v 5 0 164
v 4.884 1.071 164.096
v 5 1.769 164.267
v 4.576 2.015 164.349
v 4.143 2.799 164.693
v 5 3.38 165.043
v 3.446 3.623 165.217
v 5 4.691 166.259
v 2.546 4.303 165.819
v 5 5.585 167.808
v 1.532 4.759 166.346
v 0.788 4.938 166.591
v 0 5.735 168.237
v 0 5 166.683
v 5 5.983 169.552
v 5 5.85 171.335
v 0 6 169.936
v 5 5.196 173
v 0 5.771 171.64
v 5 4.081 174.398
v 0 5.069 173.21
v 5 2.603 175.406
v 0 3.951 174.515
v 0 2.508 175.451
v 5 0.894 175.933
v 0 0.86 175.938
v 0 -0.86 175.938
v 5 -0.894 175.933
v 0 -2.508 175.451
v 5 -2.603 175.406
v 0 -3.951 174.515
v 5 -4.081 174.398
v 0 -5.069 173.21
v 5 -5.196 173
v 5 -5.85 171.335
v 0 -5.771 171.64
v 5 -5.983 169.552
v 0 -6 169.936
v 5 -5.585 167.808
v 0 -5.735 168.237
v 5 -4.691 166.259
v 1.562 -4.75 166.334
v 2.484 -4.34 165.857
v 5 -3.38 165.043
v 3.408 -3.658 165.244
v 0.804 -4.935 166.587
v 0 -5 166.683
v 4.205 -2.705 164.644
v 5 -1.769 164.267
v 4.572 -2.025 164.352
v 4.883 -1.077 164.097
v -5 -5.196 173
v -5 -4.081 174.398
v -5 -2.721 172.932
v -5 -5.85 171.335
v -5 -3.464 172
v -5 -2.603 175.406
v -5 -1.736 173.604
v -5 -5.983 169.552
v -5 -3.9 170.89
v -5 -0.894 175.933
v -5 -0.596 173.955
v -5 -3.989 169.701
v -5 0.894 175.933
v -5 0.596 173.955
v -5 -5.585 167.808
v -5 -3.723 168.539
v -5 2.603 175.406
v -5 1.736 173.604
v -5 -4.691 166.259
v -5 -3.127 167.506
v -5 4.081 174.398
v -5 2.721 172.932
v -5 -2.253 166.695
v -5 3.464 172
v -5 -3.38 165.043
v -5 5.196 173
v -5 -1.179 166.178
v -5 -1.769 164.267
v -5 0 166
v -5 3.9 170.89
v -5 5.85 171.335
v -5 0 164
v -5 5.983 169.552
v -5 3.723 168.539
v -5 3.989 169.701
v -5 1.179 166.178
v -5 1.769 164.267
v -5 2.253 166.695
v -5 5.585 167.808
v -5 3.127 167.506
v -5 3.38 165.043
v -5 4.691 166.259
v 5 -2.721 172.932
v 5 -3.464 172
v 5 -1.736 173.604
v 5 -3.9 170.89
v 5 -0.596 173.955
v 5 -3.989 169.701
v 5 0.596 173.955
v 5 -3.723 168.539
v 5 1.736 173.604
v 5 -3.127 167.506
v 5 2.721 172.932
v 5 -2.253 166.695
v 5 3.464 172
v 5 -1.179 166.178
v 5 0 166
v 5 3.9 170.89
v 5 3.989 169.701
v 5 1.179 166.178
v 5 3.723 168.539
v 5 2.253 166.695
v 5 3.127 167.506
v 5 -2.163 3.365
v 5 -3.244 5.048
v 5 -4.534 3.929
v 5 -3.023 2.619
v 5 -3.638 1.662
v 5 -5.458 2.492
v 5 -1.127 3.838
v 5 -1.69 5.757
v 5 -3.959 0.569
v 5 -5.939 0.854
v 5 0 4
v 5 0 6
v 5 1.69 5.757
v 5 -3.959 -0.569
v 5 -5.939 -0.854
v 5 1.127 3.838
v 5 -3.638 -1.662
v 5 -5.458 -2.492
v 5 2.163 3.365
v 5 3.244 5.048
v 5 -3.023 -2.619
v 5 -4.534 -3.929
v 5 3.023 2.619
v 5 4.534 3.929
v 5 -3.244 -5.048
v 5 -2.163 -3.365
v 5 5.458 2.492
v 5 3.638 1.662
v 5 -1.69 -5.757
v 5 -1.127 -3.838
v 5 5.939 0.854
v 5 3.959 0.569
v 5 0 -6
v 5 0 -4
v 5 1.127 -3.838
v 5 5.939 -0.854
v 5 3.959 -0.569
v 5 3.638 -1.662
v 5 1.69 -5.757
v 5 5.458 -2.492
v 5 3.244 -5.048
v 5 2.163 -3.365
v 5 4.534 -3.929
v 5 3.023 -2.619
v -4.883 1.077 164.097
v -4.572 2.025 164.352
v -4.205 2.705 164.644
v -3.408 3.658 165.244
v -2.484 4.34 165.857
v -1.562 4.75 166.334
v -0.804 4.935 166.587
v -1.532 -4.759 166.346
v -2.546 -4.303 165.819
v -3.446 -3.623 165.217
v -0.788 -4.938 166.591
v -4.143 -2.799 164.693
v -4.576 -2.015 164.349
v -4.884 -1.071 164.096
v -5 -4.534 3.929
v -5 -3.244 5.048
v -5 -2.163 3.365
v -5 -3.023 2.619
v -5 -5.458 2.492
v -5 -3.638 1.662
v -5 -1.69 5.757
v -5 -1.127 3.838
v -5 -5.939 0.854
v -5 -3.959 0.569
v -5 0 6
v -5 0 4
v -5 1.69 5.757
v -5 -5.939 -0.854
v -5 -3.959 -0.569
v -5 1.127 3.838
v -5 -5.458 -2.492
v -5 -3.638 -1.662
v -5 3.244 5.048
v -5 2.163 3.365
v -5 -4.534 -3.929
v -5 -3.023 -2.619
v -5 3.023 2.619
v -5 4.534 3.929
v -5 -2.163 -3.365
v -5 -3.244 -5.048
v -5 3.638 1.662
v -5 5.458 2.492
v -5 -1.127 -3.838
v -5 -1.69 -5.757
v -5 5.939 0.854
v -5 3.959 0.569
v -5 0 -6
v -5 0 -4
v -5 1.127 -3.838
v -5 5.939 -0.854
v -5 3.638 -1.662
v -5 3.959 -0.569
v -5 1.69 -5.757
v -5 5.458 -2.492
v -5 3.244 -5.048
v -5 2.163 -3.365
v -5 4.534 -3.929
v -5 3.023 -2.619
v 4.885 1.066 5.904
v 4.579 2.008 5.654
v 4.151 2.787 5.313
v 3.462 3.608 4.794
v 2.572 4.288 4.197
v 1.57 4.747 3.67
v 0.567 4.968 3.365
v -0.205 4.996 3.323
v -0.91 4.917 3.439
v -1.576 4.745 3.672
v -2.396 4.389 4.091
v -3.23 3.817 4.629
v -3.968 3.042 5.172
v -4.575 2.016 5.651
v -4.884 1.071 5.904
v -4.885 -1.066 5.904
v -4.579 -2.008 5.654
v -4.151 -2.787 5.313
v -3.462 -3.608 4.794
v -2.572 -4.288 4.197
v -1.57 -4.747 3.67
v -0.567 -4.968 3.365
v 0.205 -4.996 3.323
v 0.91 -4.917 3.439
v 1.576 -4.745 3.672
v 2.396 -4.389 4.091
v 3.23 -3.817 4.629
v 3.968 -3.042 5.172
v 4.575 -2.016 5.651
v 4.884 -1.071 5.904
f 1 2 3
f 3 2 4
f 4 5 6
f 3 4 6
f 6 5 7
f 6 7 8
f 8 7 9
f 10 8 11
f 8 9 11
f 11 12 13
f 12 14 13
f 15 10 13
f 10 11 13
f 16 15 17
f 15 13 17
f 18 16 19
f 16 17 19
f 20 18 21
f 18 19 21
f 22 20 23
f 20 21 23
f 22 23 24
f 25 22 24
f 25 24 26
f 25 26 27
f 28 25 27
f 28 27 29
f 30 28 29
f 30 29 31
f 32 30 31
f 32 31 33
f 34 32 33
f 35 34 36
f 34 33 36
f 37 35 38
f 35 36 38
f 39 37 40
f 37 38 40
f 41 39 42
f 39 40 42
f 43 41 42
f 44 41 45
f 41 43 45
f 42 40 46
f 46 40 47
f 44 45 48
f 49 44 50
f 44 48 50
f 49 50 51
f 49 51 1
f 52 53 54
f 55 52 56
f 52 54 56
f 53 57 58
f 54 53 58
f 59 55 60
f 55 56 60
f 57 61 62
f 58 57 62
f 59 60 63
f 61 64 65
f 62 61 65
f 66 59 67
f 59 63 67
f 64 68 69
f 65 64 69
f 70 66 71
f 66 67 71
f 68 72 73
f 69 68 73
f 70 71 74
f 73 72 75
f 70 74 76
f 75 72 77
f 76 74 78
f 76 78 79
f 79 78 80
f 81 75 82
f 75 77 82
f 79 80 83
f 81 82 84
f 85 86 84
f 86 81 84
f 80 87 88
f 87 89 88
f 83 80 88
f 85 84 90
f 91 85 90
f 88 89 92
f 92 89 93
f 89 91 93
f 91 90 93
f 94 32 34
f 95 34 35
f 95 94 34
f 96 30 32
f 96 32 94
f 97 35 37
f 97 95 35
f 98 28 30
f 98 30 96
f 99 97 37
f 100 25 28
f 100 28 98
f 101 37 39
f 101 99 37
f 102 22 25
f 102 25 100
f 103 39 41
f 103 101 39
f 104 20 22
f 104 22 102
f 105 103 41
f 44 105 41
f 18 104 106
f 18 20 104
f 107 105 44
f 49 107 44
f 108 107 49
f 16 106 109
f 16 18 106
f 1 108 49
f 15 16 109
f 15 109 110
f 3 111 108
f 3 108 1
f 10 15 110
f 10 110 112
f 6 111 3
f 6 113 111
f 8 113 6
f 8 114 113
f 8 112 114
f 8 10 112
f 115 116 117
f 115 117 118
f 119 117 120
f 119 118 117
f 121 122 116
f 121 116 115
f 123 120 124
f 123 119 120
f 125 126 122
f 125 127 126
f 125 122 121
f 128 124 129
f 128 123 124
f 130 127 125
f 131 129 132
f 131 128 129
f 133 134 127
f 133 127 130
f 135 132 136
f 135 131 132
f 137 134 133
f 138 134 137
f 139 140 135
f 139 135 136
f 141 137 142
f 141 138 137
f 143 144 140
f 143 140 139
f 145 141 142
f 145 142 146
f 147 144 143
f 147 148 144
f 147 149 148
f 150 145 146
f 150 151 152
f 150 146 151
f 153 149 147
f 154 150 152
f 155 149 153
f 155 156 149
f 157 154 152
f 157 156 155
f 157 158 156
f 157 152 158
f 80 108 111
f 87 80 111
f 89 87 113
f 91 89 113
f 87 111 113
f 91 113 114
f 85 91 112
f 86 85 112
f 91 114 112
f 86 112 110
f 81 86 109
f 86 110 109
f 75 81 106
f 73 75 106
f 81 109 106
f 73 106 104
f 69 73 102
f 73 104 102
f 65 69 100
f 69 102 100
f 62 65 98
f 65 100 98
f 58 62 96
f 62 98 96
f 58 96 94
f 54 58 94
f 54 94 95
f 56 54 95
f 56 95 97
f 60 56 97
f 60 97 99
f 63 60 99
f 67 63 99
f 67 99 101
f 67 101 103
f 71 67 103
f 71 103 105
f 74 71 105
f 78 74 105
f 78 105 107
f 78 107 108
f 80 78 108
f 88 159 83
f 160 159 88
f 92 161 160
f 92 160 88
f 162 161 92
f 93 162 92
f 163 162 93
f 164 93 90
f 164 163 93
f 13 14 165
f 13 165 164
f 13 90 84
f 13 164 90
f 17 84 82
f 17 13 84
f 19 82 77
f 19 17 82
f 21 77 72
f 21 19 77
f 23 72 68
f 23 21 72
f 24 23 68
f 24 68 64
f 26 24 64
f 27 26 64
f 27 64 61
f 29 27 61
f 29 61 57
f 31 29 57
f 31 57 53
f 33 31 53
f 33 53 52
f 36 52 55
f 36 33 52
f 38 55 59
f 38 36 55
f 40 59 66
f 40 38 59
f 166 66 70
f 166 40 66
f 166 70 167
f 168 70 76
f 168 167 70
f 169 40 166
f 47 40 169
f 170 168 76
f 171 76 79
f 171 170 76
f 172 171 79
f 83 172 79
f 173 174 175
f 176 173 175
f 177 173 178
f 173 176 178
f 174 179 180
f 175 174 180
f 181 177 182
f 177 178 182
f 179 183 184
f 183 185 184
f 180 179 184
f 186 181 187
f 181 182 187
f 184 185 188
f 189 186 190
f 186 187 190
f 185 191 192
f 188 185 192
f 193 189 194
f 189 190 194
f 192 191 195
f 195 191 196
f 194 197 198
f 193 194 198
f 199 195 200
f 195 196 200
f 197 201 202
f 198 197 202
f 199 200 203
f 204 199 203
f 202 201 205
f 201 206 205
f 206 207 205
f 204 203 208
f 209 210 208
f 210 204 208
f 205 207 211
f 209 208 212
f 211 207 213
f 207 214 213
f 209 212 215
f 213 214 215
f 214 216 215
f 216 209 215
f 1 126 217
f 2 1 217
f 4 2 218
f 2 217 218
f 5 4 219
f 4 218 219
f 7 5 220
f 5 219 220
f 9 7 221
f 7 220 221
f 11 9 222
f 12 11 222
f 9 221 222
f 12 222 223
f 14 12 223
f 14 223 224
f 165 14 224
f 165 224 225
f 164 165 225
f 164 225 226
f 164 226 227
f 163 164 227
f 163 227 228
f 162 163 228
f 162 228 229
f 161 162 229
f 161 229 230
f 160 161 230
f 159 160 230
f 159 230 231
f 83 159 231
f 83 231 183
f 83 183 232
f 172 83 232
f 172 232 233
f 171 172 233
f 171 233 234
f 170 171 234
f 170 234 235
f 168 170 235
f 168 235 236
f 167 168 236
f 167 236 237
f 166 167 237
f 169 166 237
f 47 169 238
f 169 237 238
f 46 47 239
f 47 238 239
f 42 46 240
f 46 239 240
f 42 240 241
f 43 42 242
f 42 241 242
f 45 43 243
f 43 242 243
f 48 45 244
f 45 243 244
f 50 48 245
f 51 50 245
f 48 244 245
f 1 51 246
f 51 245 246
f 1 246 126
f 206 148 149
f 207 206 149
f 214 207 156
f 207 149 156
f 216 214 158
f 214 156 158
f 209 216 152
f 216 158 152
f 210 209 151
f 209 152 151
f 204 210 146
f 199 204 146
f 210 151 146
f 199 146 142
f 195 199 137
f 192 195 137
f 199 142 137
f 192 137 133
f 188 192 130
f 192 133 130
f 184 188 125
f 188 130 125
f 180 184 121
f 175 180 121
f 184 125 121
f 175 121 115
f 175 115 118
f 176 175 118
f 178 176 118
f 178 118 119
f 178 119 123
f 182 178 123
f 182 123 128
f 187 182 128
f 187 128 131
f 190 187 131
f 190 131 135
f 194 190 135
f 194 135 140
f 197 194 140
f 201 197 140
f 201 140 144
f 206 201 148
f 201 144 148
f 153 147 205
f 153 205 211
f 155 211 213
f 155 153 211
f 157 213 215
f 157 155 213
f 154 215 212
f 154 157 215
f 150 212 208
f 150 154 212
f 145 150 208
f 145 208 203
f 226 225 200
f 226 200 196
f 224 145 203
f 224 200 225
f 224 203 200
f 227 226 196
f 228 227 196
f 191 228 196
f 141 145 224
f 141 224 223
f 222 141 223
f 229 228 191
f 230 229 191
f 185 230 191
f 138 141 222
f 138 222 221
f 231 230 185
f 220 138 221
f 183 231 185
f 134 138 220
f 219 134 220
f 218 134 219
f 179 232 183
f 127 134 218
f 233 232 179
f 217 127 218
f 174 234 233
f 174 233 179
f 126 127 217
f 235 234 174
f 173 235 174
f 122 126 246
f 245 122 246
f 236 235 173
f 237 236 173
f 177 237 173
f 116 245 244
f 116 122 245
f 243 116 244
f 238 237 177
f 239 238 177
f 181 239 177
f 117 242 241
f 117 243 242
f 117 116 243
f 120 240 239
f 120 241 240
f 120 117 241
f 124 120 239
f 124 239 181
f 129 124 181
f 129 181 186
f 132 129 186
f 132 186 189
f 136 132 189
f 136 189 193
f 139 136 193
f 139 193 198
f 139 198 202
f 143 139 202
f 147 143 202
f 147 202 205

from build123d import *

# Parameters (mm, degrees)
SKETCH3_R           = 5
BOSS_EXTRUDE1_DEPTH = 170
SKETCH4_R           = 6
BOSS_EXTRUDE2_DEPTH = 5
SKETCH5_R           = 4
SKETCH5_R_2         = 3.999944286
CUT_EXTRUDE1_DEPTH  = 12


with BuildPart() as part:
    # Sketch3 → Boss-Extrude1 (new body)
    with BuildSketch(Plane.XY):
        Circle(SKETCH3_R)
    extrude(amount=BOSS_EXTRUDE1_DEPTH)

    # Sketch4 → Boss-Extrude2 (add, symmetric)
    with BuildSketch(Plane(origin=(0, 0, 0), x_dir=(0, 0, -1), z_dir=(1, 0, 0))):
        with Locations((-170, 0)):
            Circle(SKETCH4_R)
        Circle(SKETCH4_R)
    extrude(amount=BOSS_EXTRUDE2_DEPTH, both=True)

    # Sketch5 → Cut-Extrude1 (cut)
    with BuildSketch(Plane(origin=(5, 0, 0), x_dir=(0, 0, -1), z_dir=(1, 0, 0))):
        with Locations((-170, 0)):
            Circle(SKETCH5_R)
        Circle(SKETCH5_R_2)
    extrude(amount=-CUT_EXTRUDE1_DEPTH, mode=Mode.SUBTRACT)


solid = part.part
